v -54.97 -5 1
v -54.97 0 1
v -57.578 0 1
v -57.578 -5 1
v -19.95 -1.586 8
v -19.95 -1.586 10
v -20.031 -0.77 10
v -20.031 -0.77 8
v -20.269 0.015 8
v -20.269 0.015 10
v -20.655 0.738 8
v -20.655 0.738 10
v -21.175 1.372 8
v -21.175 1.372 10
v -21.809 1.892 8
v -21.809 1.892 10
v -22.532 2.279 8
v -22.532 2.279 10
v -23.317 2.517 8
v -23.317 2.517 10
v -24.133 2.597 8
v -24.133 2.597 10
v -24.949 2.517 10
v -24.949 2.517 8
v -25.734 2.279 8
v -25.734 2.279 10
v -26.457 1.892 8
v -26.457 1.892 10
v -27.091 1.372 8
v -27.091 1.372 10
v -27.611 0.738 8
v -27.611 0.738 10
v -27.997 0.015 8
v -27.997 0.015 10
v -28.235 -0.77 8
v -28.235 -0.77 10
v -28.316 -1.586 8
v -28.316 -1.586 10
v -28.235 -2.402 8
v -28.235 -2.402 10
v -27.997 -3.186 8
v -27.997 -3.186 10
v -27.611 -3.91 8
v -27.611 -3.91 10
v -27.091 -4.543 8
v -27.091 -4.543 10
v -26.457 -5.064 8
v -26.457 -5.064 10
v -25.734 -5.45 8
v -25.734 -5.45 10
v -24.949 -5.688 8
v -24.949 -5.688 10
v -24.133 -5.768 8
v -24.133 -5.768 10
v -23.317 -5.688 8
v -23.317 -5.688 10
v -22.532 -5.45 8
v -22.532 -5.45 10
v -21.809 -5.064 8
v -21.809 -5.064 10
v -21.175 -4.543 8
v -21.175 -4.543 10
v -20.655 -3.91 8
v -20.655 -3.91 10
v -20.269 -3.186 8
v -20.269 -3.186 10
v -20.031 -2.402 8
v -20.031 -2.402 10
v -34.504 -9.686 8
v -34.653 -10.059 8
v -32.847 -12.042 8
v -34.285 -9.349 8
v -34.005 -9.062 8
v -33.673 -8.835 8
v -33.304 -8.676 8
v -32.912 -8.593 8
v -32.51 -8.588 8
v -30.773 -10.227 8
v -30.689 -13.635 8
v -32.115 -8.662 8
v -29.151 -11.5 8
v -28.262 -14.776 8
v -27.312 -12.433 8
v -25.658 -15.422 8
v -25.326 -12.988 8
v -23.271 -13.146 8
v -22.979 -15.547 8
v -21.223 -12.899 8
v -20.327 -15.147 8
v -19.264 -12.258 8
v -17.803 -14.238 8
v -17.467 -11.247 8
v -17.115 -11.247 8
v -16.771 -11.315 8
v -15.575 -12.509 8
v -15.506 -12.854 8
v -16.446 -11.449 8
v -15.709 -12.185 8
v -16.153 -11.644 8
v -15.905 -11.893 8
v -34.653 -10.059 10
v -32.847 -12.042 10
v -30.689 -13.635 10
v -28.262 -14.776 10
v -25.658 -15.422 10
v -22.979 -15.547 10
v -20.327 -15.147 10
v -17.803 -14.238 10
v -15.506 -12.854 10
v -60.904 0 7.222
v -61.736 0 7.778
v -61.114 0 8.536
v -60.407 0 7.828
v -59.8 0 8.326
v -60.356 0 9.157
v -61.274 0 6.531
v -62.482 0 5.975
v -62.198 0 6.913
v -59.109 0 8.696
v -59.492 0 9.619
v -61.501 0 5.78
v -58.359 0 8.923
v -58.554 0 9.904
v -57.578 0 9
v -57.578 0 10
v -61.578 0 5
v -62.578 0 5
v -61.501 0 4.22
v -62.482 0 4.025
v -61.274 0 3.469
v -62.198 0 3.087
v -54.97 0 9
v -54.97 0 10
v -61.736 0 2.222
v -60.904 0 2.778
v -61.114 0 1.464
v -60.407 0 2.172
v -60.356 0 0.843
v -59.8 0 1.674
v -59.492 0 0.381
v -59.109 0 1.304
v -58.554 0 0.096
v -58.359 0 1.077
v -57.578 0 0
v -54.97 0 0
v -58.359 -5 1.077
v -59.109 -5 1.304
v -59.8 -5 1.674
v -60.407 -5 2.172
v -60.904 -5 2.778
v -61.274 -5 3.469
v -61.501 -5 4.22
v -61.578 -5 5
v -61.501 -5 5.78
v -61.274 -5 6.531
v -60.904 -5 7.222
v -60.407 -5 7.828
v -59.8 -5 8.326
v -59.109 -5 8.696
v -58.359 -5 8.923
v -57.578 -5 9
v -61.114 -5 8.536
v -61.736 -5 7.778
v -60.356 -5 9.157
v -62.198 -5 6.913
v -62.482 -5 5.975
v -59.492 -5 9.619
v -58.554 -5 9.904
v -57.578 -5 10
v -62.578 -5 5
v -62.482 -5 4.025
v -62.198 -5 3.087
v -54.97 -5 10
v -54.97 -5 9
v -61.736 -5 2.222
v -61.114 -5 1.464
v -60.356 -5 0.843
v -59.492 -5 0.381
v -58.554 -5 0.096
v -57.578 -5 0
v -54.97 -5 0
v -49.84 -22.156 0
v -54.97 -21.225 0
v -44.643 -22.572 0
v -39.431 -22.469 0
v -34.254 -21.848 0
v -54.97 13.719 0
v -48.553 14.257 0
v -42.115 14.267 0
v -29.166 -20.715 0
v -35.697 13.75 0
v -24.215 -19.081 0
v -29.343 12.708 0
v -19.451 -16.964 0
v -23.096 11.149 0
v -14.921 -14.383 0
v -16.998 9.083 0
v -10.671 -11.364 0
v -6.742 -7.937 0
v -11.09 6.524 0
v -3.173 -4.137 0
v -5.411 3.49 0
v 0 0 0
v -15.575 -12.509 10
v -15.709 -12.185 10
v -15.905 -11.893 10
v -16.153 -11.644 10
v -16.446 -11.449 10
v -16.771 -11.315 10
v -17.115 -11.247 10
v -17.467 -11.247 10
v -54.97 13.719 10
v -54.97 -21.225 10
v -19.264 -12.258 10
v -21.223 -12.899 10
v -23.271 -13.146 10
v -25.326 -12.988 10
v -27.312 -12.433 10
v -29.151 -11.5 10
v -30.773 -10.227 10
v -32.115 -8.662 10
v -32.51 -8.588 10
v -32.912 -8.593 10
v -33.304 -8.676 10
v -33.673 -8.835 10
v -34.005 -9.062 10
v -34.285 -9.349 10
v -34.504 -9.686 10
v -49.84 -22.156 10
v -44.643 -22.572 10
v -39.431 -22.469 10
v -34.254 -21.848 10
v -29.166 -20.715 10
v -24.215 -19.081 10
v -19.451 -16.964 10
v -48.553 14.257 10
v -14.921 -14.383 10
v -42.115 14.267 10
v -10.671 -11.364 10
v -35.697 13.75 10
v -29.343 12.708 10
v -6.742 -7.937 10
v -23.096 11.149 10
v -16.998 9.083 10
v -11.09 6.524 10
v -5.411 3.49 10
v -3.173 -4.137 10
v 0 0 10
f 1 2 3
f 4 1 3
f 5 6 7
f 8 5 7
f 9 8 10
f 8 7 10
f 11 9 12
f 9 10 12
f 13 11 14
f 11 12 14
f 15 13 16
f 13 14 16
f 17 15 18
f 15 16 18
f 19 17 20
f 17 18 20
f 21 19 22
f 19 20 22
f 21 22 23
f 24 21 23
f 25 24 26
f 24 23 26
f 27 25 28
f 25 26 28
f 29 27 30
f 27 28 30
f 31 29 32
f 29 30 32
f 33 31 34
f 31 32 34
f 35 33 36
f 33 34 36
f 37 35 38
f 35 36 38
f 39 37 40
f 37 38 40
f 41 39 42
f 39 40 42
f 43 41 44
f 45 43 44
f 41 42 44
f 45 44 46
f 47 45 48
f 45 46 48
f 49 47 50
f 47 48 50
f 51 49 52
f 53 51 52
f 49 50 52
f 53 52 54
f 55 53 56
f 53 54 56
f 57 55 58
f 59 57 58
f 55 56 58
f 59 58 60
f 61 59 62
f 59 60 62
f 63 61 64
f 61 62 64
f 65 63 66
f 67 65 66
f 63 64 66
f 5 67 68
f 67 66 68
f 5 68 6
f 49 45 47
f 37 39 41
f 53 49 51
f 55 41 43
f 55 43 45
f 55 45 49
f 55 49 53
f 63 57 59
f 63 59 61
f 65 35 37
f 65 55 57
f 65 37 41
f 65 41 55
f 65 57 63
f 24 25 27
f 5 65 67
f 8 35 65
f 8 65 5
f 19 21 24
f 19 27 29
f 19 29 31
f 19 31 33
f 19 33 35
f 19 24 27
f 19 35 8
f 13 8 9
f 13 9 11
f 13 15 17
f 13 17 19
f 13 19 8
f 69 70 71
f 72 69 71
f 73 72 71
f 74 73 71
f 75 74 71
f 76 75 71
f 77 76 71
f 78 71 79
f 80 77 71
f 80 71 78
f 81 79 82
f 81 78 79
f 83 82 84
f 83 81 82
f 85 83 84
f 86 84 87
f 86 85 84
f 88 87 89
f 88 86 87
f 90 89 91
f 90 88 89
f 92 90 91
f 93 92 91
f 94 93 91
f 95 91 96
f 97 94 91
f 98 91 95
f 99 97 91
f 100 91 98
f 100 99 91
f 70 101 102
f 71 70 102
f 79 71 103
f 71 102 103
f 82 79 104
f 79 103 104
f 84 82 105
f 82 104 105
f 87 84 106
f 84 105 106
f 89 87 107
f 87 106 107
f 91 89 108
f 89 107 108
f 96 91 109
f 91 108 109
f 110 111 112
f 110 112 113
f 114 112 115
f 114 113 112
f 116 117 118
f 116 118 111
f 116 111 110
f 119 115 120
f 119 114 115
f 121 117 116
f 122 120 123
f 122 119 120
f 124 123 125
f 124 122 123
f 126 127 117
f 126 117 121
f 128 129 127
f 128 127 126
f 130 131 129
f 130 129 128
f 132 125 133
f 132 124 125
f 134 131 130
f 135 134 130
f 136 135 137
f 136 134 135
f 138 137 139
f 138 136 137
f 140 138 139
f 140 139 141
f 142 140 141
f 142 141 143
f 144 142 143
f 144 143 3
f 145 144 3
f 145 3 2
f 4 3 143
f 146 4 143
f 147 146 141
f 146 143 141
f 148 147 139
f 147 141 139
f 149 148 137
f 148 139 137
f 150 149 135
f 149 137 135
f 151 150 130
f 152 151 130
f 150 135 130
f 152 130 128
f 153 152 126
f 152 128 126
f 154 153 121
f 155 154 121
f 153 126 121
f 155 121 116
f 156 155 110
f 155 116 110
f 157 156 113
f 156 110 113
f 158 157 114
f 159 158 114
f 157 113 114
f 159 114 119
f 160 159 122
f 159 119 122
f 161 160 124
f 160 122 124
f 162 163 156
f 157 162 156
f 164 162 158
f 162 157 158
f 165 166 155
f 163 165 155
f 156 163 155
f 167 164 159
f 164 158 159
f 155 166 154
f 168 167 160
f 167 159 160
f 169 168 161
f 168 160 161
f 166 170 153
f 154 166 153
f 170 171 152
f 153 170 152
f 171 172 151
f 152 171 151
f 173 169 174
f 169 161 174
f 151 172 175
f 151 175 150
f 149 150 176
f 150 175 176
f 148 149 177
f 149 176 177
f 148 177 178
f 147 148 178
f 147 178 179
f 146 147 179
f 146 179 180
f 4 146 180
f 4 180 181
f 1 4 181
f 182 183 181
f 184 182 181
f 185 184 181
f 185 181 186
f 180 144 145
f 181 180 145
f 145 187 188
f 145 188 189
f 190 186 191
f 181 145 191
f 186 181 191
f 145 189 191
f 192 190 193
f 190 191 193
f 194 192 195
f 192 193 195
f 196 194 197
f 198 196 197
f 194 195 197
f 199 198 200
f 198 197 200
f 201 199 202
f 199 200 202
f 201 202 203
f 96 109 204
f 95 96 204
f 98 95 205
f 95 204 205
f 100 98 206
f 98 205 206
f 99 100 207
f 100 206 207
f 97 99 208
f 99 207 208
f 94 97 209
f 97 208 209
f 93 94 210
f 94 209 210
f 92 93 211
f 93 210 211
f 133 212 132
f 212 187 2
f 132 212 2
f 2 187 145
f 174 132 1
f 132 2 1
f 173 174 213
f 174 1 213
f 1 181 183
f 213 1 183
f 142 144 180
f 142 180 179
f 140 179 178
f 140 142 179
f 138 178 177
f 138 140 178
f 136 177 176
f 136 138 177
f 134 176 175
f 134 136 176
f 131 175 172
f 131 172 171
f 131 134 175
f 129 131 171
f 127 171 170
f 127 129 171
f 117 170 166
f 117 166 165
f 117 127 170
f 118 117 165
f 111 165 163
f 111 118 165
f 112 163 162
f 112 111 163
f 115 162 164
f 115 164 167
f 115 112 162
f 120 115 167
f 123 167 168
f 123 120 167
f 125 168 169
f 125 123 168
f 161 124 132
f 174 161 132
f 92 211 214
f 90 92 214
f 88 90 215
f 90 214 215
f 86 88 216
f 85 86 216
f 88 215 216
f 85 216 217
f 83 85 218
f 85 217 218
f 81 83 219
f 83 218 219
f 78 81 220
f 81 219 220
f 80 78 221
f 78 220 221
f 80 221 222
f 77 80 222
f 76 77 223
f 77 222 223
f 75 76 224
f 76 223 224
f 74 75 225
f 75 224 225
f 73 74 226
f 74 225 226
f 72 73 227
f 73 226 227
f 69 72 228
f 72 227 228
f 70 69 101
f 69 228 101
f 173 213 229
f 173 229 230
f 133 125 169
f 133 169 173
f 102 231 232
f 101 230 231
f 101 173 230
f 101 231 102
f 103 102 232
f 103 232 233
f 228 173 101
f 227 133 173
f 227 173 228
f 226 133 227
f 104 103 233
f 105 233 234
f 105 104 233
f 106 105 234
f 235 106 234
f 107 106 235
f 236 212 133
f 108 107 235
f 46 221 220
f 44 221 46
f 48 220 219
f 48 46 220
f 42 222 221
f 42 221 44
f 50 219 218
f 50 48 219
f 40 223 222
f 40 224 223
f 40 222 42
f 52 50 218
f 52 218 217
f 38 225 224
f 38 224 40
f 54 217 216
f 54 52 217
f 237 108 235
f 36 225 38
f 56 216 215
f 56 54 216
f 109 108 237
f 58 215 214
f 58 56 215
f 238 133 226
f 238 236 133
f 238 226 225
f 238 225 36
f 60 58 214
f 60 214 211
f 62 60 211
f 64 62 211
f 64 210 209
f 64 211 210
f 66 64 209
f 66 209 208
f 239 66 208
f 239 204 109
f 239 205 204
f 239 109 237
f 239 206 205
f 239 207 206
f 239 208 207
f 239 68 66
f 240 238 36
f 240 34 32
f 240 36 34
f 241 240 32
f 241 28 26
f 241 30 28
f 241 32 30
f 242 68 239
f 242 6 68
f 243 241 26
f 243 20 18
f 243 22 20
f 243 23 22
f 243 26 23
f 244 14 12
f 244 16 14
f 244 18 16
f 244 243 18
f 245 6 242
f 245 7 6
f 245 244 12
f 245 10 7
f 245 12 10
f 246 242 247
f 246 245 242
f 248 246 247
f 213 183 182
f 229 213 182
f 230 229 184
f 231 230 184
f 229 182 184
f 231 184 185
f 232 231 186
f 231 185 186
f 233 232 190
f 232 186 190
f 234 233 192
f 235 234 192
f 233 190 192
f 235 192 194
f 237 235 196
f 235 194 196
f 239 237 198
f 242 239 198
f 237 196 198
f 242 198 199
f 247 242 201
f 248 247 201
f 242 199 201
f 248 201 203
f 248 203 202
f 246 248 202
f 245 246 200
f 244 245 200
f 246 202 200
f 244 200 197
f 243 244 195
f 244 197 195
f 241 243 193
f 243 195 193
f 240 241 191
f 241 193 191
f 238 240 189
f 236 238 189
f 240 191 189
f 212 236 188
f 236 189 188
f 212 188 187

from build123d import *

# Parameters (mm, degrees)
EXTRUDE_1_DEPTH     = 10
SKETCH_2_R          = 4.182683646
CUT_EXTRUDE_1_DEPTH = 2
CUT_EXTRUDE_2_DEPTH = 2
EXTRUDE_2_DEPTH     = 5
CUT_EXTRUDE_4_DEPTH = 5


with BuildPart() as part:
    # 草圖1 → 填料-伸長1 (new body)
    with BuildSketch(Plane.XY):
        with BuildLine():
            Line((-54.969523774, 13.719179235), (-54.969523774, -21.22476033))
            ThreePointArc((-54.969523774, -21.22476033), (-24.214711694, -19.081408744), (0, 0))
            ThreePointArc((0, 0), (-26.203666434, 11.992637721), (-54.969523774, 13.719179235))
        make_face()
    extrude(amount=EXTRUDE_1_DEPTH)

    # 草圖2 → 除料-伸長1 (cut)
    with BuildSketch(Plane(origin=(-3.59892411, 0, 10), x_dir=(1, 0, 0), z_dir=(0, 0, 1))):
        with Locations((-20.534055943, -1.585781503)):
            Circle(SKETCH_2_R)
    extrude(amount=-CUT_EXTRUDE_1_DEPTH, mode=Mode.SUBTRACT)

    # 草圖3 → 除料-伸長2 (cut)
    with BuildSketch(Plane(origin=(-4.498655138, 1.869163063, 10), x_dir=(1, 0, 0), z_dir=(0, 0, 1))):
        with BuildLine():
            ThreePointArc((-30.154301824, -11.927771695), (-21.15958892, -17.29086396), (-11.007087523, -14.722920379))
            ThreePointArc((-11.007087523, -14.722920379), (-11.654774806, -13.513501992), (-12.967946819, -13.116298119))
            ThreePointArc((-12.967946819, -13.116298119), (-20.827814666, -14.857391145), (-27.616719206, -10.530763976))
            ThreePointArc((-27.616719206, -10.530763976), (-29.174840287, -10.703717268), (-30.154301824, -11.927771695))
        make_face()
    extrude(amount=-CUT_EXTRUDE_2_DEPTH, mode=Mode.SUBTRACT)

    # 草圖4 → 填料-伸長2 (add)
    with BuildSketch(Plane(origin=(0, 0, 0), x_dir=(1, 0, 0), z_dir=(0, 1, 0))):
        with BuildLine():
            Line((-54.969523774, 0), (-57.578183819, 0))
            ThreePointArc((-57.578183819, 0), (-62.578183819, -5), (-57.578183819, -10))
            Line((-57.578183819, -10), (-54.969523774, -10))
            Line((-54.969523774, -10), (-54.969523774, 0))
        make_face()
    extrude(amount=-EXTRUDE_2_DEPTH)

    # 草圖5 → 除料-伸長4 (cut)
    with BuildSketch(Plane(origin=(0, 0, 0), x_dir=(1, 0, 0), z_dir=(0, 1, 0))):
        with BuildLine():
            Line((-54.969523774, -1), (-57.578183819, -1))
            ThreePointArc((-57.578183819, -1), (-61.578183819, -5), (-57.578183819, -9))
            Line((-57.578183819, -9), (-54.969523774, -9))
            Line((-54.969523774, -9), (-54.969523774, -1))
        make_face()
    extrude(amount=-CUT_EXTRUDE_4_DEPTH, mode=Mode.SUBTRACT)


solid = part.part
